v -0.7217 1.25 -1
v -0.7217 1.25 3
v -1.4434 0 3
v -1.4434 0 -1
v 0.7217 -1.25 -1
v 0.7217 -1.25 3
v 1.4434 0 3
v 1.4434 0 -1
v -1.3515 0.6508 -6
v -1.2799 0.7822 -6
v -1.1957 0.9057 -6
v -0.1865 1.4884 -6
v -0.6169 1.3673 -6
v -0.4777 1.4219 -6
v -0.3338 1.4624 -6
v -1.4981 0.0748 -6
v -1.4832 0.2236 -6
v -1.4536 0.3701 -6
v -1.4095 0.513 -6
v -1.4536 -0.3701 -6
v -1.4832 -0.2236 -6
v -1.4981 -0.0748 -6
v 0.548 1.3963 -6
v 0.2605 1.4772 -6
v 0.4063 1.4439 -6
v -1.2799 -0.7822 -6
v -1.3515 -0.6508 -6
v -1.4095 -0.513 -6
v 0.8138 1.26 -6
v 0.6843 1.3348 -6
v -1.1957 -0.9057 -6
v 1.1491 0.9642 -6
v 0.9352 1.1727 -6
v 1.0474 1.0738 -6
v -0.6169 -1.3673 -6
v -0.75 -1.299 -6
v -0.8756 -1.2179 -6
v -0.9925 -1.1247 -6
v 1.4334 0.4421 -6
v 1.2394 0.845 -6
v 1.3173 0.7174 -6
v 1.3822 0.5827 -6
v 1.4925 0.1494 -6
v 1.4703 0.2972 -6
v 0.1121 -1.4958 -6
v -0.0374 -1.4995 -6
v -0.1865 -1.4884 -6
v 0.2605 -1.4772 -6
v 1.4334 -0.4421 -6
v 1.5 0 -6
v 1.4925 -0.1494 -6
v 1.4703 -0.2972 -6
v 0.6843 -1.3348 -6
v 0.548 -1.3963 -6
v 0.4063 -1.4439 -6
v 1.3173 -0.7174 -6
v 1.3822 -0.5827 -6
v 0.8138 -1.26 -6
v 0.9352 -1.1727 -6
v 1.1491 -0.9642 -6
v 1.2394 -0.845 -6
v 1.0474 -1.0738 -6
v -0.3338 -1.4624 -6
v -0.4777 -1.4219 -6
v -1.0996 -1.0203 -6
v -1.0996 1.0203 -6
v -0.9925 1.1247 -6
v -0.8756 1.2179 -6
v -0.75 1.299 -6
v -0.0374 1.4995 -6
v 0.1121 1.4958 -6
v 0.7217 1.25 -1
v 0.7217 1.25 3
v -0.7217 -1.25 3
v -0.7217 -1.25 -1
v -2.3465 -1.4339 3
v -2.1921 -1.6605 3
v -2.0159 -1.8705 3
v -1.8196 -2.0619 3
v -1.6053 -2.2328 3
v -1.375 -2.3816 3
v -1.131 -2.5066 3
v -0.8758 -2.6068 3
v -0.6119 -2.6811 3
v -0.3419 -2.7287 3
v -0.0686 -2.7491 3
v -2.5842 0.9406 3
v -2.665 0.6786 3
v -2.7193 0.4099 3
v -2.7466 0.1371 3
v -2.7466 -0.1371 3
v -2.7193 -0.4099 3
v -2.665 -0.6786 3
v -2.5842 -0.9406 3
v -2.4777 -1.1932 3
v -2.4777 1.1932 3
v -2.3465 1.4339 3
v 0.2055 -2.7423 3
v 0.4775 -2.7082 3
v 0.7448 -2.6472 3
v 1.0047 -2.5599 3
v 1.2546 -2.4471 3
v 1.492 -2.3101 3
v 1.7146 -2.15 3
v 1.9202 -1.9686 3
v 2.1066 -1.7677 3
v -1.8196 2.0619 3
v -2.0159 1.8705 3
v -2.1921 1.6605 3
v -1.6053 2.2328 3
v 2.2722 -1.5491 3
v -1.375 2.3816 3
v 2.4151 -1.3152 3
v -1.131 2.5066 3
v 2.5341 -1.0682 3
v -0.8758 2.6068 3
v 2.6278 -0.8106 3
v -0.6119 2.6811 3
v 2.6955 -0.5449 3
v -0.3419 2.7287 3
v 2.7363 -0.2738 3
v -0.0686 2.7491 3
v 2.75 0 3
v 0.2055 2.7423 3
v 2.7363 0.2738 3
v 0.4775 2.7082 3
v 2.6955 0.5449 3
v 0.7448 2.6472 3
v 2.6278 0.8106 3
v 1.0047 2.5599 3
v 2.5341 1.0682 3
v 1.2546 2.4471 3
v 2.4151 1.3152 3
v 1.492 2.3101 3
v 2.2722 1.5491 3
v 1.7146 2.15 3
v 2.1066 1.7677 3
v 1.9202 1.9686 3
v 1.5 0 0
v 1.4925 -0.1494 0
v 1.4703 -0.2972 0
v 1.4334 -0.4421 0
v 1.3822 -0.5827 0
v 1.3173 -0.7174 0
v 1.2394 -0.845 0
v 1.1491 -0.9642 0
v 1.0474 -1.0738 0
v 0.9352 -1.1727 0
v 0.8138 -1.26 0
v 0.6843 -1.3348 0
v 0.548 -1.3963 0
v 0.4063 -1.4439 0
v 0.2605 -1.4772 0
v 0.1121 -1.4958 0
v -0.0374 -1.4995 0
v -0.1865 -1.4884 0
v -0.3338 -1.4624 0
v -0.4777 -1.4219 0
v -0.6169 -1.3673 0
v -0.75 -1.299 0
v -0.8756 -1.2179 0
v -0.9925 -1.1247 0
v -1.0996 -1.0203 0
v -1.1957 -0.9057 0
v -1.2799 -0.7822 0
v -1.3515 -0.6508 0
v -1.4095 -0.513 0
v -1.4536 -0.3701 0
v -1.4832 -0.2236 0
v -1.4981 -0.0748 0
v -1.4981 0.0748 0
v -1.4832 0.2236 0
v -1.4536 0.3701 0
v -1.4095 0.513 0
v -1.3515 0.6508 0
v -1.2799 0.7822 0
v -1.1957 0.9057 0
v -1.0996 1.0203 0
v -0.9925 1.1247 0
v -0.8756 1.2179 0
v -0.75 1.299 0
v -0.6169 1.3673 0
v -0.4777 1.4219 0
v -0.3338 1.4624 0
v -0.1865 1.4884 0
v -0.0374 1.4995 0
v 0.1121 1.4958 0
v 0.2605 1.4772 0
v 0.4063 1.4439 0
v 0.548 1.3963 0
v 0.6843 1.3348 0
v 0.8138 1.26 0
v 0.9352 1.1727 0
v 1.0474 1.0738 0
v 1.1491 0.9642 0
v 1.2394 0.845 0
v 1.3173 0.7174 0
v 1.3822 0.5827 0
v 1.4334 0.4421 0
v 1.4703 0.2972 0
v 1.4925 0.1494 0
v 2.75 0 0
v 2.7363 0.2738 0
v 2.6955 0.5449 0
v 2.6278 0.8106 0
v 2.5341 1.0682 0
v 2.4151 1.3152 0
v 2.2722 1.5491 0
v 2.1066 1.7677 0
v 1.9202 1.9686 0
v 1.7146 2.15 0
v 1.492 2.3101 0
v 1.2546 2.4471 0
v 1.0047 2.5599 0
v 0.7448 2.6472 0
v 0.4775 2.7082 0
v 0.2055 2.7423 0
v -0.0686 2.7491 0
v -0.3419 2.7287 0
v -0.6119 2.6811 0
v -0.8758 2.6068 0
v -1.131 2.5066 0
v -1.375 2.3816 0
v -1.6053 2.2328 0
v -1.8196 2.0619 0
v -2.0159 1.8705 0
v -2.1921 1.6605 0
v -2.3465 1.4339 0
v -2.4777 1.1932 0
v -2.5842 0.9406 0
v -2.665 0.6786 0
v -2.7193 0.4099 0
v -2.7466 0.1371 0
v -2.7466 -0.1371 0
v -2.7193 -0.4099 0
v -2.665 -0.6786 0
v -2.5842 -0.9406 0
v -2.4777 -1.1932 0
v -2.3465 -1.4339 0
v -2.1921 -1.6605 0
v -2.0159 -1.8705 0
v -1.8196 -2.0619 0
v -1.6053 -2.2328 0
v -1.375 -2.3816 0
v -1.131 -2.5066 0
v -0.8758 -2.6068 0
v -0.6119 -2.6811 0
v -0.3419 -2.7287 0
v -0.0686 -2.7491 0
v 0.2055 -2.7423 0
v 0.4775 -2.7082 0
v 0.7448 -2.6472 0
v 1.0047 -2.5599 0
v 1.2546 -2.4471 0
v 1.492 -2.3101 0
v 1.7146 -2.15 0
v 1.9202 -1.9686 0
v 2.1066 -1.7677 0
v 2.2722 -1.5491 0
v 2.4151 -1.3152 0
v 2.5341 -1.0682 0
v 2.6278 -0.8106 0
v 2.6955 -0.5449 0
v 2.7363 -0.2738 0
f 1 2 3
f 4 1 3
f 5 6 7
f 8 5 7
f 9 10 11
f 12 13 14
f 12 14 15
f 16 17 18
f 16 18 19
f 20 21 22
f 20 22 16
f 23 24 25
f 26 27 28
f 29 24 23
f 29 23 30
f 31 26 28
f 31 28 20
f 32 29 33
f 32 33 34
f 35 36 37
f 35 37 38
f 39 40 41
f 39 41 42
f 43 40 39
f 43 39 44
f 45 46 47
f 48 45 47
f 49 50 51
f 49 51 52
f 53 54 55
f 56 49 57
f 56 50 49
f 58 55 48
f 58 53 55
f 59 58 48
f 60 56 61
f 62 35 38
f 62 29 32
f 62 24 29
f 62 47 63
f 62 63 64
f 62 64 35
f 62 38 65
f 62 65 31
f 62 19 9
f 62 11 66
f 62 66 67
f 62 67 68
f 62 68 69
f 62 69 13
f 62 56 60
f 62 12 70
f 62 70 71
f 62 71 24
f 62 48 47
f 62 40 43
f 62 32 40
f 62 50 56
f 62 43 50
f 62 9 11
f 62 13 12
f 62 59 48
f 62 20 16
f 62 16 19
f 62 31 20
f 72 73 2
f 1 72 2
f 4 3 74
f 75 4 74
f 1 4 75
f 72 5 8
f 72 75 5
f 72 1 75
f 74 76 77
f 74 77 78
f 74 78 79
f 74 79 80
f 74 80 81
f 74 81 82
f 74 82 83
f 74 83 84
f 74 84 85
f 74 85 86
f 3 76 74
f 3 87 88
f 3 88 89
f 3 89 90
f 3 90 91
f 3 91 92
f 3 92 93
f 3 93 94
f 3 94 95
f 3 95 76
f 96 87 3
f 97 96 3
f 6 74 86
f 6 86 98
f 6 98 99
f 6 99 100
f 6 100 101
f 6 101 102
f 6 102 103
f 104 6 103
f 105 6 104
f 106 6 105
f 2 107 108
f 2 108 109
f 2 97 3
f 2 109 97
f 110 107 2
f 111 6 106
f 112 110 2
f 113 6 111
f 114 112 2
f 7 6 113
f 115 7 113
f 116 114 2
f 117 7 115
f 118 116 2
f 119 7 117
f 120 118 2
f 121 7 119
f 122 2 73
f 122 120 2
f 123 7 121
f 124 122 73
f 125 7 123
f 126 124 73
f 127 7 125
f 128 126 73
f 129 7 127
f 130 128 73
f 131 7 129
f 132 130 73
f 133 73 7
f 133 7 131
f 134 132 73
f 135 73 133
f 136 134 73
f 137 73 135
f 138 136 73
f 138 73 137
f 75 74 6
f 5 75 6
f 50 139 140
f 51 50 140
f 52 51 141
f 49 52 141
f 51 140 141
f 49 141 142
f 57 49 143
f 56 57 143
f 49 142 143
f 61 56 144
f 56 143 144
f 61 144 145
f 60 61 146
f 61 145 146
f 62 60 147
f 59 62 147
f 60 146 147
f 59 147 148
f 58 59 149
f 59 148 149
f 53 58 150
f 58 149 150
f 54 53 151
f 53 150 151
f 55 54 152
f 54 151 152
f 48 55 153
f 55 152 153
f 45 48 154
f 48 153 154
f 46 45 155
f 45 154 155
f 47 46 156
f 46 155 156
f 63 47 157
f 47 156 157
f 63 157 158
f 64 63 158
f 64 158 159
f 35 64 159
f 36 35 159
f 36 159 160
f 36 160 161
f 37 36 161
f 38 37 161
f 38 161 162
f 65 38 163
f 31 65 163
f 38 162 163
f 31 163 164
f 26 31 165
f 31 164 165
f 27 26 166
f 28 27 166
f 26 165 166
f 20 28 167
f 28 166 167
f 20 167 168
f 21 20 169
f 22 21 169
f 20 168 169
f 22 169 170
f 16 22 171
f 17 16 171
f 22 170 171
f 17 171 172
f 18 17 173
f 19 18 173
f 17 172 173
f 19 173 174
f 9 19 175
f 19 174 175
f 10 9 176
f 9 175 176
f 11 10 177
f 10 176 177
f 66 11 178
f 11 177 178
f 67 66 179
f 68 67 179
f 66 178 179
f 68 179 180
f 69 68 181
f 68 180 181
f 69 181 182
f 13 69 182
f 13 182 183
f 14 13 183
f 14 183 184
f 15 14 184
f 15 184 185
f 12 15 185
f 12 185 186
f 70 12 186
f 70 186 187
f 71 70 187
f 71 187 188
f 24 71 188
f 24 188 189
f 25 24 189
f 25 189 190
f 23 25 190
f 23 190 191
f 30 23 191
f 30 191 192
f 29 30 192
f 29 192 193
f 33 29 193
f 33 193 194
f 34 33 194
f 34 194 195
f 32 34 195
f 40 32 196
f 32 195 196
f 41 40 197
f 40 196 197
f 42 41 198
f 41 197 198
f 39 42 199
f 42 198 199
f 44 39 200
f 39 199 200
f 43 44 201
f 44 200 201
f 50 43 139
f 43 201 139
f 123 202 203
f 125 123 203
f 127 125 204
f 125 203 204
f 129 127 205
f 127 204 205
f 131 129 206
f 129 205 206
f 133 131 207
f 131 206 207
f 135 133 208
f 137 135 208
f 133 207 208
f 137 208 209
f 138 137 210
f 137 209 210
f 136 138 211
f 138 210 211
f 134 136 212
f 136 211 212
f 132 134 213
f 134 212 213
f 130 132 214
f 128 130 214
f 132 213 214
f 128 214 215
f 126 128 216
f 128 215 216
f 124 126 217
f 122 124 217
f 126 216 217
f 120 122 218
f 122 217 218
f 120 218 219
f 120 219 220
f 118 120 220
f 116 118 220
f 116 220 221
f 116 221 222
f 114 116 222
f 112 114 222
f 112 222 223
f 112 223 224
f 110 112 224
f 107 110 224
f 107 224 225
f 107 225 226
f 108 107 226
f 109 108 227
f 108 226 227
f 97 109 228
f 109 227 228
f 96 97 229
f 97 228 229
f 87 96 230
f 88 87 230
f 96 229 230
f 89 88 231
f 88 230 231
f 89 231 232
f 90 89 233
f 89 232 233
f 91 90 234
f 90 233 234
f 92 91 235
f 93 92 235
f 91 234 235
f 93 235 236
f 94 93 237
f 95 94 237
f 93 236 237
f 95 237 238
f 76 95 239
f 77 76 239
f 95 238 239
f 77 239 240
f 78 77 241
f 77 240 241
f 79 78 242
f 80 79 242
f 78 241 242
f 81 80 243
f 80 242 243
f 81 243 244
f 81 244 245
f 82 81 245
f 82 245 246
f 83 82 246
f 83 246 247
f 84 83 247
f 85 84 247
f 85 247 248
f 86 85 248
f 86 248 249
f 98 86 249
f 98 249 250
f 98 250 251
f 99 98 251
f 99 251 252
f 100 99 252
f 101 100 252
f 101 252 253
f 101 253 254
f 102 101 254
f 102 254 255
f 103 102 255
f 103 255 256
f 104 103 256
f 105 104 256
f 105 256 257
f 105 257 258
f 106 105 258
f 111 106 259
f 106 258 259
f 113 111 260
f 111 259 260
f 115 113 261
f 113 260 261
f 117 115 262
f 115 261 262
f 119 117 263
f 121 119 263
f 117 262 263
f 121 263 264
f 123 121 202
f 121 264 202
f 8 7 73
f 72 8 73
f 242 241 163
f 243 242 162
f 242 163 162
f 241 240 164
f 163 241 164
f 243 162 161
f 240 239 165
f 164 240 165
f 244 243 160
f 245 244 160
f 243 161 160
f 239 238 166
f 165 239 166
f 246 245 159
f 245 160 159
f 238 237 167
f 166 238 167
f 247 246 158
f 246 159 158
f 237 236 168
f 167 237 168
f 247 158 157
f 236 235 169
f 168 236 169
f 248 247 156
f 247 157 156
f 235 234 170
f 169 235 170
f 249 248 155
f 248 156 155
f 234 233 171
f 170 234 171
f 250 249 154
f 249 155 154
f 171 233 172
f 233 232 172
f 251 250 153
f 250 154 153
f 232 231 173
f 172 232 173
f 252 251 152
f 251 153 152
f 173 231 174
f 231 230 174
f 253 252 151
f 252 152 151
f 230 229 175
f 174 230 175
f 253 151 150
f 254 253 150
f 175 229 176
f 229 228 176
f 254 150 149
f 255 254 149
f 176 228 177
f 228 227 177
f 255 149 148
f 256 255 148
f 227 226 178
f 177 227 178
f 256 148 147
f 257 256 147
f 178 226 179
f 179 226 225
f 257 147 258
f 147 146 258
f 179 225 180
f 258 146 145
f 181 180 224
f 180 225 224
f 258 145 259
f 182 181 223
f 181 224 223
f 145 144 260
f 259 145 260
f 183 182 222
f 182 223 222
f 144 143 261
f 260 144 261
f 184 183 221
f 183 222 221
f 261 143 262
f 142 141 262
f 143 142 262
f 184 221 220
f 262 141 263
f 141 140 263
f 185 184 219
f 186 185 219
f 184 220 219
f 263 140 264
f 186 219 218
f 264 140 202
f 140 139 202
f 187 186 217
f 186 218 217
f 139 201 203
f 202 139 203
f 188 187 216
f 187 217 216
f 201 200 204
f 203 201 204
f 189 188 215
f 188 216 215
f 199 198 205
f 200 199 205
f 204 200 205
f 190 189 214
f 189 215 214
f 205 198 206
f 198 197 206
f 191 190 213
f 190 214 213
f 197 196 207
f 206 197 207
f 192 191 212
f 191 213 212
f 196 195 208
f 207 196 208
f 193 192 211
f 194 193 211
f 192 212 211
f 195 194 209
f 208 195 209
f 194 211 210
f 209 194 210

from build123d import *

# Parameters (mm, degrees)
SKETCH_R     = 2.75
PAD_DEPTH    = 3
SKETCH001_R  = 1.5
PAD001_DEPTH = 6
POCKET_DEPTH = 4


with BuildPart() as part:
    # Sketch → Pad (new body)
    with BuildSketch(Plane.XY):
        Circle(SKETCH_R)
    extrude(amount=PAD_DEPTH)

    # Sketch001 (on Face2 of Pad) → Pad001 (join)
    with BuildSketch(Plane(origin=(0, 0, 0), x_dir=(1, 0, 0), z_dir=(0, 0, -1))):
        Circle(SKETCH001_R)
    extrude(amount=PAD001_DEPTH)

    # Sketch002 (on DatumPlane) → Pocket (cut)
    with BuildSketch(Plane.XY.offset(3)):
        Polygon((0.721688, -1.25), (1.443376, 0), (0.721688, 1.25), (-0.721688, 1.25), (-1.443376, 0), (-0.721688, -1.25), align=None)
    extrude(amount=-POCKET_DEPTH, mode=Mode.SUBTRACT)


solid = part.part
